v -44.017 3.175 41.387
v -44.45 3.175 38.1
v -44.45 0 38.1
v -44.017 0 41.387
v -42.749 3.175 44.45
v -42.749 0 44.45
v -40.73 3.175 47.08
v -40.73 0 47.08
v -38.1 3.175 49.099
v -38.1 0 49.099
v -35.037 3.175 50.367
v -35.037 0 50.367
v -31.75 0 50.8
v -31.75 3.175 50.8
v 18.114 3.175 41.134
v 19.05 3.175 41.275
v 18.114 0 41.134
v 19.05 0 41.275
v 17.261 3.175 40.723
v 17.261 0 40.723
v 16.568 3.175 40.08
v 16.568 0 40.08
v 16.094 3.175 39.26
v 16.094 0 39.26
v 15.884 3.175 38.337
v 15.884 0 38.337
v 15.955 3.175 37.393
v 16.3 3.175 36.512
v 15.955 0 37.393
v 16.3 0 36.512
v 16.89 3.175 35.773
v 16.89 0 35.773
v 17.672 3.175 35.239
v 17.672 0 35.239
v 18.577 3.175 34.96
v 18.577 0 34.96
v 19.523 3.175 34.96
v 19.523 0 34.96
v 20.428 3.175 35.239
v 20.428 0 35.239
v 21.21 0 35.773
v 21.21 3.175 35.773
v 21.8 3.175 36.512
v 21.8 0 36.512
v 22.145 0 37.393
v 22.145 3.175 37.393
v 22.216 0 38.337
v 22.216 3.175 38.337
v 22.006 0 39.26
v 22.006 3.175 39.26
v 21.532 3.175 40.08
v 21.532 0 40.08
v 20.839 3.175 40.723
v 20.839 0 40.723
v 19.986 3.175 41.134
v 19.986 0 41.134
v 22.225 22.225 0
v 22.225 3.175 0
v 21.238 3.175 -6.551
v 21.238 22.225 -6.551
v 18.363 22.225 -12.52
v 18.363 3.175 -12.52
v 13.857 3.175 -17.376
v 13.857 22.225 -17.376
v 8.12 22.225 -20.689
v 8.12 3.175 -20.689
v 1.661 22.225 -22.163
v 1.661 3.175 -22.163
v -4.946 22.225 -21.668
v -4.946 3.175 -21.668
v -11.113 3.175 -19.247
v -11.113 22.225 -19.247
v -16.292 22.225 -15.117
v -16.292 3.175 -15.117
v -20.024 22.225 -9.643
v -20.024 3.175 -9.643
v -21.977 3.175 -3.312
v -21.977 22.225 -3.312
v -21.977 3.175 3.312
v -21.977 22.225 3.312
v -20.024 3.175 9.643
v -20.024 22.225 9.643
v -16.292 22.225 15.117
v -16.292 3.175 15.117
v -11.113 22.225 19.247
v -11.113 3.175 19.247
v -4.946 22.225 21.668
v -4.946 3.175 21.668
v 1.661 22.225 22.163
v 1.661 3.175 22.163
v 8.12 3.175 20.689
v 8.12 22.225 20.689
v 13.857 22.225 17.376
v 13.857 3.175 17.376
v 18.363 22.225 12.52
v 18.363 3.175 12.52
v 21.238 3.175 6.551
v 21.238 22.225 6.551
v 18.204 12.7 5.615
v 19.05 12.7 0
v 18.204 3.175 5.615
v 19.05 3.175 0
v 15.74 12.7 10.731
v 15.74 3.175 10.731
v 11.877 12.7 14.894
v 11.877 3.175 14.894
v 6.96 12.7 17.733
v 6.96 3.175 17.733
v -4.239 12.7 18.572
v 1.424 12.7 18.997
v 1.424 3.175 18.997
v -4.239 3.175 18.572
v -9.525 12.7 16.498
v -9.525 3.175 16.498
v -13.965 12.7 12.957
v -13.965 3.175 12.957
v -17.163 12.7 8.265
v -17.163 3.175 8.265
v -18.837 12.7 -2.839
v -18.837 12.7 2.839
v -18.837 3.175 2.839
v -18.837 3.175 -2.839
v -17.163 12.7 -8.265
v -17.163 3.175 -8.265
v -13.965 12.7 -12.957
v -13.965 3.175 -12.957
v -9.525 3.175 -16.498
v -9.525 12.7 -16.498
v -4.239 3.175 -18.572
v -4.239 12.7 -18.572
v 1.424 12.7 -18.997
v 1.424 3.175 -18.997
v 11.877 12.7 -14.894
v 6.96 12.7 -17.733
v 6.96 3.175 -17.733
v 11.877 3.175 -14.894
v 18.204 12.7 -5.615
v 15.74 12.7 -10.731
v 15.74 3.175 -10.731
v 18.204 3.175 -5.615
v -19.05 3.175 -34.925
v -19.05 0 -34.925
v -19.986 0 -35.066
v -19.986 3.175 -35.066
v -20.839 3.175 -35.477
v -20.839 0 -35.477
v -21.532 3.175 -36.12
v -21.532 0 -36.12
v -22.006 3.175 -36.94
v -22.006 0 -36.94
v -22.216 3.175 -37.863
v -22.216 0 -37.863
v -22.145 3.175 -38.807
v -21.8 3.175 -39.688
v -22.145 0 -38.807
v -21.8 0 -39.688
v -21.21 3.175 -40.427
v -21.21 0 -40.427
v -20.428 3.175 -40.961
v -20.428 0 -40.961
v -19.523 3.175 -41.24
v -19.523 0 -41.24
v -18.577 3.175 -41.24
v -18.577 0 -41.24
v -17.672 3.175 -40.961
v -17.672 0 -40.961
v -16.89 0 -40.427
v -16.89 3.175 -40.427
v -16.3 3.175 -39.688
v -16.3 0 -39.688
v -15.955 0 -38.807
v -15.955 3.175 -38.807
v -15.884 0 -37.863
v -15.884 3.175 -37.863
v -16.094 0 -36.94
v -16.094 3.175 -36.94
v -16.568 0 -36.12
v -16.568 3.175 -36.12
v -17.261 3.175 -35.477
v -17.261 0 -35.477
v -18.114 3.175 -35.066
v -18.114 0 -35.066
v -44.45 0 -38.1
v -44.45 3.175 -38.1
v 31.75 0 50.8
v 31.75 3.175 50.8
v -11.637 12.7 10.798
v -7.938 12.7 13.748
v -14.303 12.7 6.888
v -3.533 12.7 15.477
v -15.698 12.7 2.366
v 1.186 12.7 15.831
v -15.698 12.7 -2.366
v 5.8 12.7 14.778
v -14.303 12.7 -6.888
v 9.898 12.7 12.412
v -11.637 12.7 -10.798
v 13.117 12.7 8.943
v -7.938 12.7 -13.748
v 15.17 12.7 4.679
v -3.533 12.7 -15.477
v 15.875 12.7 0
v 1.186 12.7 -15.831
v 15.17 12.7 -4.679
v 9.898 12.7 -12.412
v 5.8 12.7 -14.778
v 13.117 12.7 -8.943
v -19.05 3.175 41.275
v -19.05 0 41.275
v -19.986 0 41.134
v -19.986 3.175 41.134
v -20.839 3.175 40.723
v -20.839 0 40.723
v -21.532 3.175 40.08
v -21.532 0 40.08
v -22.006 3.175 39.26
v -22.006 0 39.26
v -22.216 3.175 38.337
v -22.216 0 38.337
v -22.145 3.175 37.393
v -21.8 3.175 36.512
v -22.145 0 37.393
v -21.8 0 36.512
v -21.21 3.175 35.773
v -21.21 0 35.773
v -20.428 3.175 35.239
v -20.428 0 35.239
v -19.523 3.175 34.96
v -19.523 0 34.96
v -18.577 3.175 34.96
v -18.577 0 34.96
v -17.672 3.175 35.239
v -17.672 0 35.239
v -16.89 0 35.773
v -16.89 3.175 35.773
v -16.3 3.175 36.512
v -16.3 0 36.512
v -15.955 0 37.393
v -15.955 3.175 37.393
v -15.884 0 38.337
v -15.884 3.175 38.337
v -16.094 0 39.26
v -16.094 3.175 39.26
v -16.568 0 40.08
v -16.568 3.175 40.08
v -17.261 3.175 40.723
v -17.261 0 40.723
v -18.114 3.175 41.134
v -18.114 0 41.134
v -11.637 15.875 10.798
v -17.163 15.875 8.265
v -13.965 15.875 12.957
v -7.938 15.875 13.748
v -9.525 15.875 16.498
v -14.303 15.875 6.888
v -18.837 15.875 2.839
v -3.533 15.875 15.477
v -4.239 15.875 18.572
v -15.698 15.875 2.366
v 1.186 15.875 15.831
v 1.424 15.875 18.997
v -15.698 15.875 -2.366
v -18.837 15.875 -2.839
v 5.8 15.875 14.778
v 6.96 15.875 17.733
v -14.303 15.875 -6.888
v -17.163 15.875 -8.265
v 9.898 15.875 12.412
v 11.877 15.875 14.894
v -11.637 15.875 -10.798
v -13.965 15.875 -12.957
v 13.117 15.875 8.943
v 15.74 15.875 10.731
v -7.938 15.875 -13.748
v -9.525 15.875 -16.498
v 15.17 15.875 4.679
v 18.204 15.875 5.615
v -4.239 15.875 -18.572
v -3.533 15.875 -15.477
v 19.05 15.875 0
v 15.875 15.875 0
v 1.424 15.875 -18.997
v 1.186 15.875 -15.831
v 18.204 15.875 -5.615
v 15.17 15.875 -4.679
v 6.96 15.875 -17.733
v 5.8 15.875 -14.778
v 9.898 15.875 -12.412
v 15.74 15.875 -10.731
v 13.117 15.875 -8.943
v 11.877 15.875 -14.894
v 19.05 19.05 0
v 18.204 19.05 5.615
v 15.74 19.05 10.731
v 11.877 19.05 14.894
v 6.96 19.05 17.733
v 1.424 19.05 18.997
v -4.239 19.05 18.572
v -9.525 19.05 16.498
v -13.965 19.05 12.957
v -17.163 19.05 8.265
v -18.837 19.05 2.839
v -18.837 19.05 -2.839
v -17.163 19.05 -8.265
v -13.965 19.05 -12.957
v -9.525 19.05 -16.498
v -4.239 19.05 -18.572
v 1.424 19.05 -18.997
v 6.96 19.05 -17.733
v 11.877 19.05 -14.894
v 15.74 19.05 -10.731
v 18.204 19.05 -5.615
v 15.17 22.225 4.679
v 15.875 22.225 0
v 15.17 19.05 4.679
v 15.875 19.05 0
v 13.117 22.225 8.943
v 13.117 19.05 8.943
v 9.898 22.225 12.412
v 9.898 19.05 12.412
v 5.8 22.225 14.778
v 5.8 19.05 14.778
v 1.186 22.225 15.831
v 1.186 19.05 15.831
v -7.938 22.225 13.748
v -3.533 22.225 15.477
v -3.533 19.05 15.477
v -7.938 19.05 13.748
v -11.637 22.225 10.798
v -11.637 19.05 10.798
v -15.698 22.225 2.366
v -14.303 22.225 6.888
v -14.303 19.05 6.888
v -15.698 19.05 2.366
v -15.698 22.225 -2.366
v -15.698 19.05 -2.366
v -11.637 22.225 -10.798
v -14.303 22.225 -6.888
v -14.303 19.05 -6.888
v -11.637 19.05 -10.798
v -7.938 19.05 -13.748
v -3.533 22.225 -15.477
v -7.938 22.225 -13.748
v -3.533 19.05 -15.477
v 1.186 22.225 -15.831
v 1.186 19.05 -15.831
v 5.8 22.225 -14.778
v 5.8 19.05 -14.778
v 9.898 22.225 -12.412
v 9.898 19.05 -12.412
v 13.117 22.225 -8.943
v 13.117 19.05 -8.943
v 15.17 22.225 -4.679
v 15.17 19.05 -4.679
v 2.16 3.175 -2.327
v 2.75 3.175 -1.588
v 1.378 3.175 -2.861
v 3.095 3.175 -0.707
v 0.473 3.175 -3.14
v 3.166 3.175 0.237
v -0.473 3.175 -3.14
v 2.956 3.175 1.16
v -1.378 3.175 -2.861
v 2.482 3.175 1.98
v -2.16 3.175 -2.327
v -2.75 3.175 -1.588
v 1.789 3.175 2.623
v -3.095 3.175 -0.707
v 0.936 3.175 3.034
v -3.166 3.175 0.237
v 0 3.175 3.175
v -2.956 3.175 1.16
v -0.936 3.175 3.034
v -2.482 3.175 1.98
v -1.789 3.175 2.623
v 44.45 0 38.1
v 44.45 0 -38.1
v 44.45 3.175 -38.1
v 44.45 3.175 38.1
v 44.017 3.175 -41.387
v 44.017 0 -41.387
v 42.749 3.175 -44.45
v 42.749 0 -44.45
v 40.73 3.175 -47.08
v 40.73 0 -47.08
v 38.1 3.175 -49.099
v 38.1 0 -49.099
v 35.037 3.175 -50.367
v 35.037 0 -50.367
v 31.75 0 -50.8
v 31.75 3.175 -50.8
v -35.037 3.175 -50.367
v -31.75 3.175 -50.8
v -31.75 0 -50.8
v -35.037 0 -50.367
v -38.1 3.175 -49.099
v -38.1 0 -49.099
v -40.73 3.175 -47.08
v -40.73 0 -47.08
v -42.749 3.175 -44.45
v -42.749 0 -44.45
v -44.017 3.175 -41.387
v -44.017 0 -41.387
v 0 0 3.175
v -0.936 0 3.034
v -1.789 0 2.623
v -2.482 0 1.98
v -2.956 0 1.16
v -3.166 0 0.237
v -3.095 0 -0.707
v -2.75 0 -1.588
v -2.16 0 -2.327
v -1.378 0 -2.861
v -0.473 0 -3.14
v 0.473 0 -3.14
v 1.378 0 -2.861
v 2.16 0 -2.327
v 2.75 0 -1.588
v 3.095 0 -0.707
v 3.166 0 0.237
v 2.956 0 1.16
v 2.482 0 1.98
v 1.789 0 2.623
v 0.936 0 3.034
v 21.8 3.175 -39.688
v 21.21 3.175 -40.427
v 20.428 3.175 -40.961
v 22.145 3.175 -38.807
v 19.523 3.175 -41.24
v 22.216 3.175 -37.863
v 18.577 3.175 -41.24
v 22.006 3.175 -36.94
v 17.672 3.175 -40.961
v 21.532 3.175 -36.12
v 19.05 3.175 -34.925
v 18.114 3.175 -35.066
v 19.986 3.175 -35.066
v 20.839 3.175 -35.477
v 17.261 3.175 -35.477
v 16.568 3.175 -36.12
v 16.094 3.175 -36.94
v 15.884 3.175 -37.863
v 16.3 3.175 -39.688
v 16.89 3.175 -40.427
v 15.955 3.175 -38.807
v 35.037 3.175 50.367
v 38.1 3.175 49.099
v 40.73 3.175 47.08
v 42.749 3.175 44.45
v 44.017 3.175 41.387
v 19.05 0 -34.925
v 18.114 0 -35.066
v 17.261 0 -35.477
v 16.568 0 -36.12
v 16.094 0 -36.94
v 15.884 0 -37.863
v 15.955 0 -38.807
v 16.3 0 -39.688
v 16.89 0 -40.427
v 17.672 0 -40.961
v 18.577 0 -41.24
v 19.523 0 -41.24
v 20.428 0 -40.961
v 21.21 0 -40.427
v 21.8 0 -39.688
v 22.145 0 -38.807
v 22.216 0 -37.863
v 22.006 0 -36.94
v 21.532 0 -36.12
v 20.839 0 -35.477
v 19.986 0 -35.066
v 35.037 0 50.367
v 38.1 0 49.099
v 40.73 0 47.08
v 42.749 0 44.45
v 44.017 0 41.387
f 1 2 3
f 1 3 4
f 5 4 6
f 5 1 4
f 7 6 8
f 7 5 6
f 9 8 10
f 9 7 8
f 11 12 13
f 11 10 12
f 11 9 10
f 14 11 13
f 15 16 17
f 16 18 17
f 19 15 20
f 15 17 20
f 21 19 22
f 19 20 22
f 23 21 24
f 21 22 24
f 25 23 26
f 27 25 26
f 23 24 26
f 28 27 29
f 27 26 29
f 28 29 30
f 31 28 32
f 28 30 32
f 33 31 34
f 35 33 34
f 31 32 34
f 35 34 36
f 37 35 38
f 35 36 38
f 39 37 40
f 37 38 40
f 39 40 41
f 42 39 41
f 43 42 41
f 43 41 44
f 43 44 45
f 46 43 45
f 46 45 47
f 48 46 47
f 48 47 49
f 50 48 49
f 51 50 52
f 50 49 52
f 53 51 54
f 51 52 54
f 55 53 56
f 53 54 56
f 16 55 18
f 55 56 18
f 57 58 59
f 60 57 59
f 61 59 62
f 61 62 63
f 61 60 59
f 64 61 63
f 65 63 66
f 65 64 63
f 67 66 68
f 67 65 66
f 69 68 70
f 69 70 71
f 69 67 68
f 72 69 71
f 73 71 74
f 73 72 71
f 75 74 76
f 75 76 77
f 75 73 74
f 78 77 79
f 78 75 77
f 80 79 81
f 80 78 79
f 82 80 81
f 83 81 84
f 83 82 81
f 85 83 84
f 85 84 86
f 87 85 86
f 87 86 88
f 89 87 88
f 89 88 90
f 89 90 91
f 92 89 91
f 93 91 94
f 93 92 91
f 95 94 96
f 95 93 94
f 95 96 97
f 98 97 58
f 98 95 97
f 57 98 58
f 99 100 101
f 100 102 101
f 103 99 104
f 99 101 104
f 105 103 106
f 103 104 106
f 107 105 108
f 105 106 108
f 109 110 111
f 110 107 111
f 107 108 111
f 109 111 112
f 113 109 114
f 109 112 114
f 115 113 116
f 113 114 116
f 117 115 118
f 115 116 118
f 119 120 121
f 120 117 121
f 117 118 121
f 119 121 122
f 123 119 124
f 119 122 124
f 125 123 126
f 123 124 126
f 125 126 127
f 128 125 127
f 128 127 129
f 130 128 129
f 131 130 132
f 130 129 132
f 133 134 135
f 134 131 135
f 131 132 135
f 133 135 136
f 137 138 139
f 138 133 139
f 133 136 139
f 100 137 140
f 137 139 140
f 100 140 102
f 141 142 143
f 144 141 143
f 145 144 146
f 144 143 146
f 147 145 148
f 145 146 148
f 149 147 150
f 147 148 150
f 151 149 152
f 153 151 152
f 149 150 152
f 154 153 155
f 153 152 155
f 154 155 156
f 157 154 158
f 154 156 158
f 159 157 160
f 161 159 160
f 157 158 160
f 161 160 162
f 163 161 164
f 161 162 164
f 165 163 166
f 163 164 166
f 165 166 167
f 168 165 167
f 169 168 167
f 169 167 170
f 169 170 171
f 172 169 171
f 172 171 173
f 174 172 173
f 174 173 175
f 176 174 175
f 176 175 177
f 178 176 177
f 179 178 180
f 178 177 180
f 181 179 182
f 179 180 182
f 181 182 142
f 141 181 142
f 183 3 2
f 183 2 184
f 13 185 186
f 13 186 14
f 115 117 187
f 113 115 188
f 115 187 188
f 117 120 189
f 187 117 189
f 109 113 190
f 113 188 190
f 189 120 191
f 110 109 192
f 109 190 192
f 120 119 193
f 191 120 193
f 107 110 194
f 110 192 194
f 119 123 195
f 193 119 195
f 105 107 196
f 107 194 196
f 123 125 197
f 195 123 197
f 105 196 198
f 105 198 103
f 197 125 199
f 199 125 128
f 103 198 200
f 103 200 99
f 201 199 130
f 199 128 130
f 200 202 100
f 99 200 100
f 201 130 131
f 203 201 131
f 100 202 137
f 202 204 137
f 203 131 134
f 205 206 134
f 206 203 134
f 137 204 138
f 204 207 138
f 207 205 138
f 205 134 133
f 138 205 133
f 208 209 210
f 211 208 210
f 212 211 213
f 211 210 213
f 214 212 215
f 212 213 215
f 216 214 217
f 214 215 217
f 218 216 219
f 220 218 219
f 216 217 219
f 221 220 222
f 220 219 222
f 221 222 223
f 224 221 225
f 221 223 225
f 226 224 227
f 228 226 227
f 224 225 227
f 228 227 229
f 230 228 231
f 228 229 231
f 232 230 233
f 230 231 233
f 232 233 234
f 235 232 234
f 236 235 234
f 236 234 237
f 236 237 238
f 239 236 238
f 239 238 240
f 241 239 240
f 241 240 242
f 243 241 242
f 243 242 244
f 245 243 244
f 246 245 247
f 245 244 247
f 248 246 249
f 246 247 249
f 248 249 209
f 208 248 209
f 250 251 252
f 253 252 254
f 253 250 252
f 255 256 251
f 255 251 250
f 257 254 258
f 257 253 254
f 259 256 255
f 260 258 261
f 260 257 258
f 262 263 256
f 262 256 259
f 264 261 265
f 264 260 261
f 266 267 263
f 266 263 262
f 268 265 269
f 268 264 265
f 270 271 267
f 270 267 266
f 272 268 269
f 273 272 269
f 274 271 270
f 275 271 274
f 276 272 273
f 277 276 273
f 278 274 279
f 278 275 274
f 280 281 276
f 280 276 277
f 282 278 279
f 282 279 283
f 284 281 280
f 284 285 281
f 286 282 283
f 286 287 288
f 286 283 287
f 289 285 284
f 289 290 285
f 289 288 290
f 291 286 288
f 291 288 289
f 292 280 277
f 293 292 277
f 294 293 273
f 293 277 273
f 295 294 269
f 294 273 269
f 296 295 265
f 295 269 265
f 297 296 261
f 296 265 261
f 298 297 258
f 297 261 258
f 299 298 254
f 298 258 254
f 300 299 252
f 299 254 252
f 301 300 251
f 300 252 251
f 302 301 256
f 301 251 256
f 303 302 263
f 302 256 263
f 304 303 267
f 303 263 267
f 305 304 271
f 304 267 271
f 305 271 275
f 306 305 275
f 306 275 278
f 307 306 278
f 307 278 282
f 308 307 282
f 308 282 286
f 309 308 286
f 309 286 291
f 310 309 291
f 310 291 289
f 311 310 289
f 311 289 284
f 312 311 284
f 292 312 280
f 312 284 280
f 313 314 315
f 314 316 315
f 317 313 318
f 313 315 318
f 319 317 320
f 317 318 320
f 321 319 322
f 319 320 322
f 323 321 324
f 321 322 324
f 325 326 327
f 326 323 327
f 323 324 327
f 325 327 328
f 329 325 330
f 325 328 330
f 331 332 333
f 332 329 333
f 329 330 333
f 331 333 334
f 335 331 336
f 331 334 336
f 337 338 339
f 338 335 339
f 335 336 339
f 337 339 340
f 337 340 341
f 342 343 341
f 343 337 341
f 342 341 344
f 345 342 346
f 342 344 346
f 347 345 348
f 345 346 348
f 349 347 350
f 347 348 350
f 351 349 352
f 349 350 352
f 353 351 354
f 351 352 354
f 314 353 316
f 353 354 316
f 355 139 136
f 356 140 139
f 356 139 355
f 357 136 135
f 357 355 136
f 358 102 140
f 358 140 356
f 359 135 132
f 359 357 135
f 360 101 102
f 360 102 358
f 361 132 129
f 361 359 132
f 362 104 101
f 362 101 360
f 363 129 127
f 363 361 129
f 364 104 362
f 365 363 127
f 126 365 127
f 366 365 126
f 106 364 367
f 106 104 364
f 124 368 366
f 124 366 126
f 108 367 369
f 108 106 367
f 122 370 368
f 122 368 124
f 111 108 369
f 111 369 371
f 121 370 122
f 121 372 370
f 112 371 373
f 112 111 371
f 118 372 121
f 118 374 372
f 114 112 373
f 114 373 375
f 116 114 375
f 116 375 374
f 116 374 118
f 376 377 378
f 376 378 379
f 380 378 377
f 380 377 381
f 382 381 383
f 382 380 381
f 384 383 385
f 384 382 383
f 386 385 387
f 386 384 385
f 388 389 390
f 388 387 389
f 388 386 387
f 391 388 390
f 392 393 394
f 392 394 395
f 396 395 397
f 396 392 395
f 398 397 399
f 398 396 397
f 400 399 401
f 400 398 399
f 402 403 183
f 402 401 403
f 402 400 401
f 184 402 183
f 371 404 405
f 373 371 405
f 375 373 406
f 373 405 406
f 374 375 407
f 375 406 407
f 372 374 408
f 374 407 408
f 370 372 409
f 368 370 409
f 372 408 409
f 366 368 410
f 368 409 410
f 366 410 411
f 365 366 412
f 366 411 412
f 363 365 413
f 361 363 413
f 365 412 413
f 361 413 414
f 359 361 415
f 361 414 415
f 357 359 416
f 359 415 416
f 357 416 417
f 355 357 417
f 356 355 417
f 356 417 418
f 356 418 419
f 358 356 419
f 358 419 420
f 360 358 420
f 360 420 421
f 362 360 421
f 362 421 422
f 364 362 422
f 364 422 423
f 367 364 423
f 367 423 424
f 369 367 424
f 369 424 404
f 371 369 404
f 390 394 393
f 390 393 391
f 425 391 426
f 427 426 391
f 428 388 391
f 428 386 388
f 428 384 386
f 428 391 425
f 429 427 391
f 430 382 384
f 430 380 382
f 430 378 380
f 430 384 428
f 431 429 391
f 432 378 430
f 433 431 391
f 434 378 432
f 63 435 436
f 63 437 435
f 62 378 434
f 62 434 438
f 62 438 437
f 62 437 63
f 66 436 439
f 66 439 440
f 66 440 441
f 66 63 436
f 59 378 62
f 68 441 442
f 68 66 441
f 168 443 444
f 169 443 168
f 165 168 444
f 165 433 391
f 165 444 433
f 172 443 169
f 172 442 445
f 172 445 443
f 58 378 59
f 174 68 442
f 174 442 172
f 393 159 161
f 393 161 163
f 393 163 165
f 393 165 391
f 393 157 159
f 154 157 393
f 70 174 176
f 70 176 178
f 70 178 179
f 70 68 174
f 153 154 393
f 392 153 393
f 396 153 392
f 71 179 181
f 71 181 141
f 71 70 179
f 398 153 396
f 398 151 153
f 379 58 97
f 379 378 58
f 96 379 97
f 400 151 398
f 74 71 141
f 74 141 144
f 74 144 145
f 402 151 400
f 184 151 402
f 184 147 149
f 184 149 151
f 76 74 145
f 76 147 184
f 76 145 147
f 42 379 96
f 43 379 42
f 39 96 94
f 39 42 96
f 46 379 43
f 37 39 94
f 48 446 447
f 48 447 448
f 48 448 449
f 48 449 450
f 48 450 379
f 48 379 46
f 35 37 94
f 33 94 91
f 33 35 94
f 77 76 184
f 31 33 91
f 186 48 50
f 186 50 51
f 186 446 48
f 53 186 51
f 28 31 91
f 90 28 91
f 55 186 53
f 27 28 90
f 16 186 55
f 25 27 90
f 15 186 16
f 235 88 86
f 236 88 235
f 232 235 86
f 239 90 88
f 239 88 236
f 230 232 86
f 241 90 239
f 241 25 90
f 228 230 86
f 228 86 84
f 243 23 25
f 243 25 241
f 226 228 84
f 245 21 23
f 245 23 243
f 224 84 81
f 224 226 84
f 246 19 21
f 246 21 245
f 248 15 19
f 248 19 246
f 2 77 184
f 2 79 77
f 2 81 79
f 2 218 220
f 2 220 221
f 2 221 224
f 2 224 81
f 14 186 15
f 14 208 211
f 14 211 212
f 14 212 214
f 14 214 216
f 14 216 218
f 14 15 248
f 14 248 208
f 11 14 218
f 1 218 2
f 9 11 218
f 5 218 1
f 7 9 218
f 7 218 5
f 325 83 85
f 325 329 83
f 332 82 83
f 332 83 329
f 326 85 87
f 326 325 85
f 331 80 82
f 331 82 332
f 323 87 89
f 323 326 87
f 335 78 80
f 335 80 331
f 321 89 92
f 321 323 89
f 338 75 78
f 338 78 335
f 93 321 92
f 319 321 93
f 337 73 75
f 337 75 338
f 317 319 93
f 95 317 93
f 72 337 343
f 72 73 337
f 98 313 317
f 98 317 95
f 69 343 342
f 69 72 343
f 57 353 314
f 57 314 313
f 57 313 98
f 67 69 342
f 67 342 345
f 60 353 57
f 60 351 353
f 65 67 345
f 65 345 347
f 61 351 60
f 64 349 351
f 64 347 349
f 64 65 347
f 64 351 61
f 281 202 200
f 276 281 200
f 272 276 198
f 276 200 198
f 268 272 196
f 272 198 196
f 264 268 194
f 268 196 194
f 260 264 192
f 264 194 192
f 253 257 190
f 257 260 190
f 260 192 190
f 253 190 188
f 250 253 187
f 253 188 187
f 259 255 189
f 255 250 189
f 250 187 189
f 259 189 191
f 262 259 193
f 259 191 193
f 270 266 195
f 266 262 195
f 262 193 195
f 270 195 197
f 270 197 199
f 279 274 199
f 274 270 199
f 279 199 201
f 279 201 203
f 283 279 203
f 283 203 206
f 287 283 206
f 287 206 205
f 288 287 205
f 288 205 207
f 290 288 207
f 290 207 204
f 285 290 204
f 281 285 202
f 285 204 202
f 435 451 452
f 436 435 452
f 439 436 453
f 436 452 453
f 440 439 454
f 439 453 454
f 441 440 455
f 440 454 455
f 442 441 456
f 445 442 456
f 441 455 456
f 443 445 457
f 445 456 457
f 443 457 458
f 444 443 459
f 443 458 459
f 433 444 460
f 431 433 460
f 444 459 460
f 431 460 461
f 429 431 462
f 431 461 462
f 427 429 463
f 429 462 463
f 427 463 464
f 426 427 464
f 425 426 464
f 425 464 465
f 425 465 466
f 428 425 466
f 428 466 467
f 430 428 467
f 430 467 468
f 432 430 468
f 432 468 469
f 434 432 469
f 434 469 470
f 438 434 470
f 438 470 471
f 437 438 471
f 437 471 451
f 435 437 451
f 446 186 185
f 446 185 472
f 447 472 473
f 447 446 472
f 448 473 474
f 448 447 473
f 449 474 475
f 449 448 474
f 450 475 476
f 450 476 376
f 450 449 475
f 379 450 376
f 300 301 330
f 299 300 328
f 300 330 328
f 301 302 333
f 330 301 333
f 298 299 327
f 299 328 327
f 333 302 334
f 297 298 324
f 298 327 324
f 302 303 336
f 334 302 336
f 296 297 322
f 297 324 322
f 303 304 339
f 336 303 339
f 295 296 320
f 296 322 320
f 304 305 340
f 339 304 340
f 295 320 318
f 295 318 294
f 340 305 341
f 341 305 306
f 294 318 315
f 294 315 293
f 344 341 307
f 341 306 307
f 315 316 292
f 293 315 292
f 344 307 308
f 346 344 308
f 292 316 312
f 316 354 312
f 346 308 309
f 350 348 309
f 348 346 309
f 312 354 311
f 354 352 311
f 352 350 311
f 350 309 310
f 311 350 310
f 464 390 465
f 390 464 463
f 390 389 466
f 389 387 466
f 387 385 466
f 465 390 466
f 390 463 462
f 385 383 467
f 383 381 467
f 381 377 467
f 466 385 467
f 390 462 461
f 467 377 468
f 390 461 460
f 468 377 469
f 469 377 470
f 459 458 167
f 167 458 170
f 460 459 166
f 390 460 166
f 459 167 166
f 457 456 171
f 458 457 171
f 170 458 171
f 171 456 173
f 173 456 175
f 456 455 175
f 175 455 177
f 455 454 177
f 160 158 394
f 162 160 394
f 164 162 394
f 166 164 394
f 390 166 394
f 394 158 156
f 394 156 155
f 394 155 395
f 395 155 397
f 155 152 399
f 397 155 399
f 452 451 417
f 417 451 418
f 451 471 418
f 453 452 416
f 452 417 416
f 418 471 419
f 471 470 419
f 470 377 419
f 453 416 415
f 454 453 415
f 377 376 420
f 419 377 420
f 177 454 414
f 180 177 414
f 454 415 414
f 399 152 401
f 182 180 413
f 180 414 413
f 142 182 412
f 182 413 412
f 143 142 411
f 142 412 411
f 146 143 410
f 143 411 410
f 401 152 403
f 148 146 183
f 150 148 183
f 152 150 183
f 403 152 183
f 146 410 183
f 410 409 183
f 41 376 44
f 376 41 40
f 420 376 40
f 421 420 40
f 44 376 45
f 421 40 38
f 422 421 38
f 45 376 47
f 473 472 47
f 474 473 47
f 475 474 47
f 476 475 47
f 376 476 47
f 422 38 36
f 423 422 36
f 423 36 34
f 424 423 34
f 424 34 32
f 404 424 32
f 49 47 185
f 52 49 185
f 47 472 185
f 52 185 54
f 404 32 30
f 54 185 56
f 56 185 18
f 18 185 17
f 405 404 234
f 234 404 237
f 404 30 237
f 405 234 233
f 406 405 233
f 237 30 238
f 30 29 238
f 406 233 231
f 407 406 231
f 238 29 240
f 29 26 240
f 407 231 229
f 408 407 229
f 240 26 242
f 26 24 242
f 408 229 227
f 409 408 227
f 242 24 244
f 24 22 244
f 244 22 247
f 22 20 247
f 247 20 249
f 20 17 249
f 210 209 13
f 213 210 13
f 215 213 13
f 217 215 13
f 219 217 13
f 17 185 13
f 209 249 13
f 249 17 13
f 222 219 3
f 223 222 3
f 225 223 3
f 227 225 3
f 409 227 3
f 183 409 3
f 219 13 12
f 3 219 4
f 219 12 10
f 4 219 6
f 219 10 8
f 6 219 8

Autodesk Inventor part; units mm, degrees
ref_plane "YZ Plane" through (0, 0, 0) normal (1, 0, 0) x (0, 1, 0)
ref_plane "XZ Plane" through (0, 0, 0) normal (0, 1, 0) x (-1, 0, 0)
ref_plane "XY Plane" through (0, 0, 0) normal (0, 0, 1) x (1, 0, 0)
sketch "Sketch2" plane through (0, 0, 0) normal (0, 1, 0) x (-1, 0, 0)
  line L0 (-44.45, 50.8) -> (44.45, 50.8)
  line L1 (44.45, 50.8) -> (44.45, -50.8)
  line L2 (44.45, -50.8) -> (-44.45, -50.8)
  line L3 (-44.45, -50.8) -> (-44.45, 50.8)
  point P0 (0, 0)
  dimension "d0" = 44.45
  dimension "d1" = 44.45
  dimension "d2" = 50.8
  dimension "d3" = 50.8
extrude "Extrusion1" add sketch "Sketch2" along normal blind 3.175
fillet "Fillet1" radius 12.7 4 edges at (44.45, 1.5875, 50.8) (-44.45, 1.5875, 50.8) (44.45, 1.5875, -50.8) (-44.45, 1.5875, -50.8)
sketch "Sketch3" plane through (0, 3.175, 0) normal (0, 1, 0) x (1, 0, 0)
  line L0 (-44.45, -38.1) -> (-44.45, 38.1) projected
  line L1 (31.75, -50.8) -> (-31.75, -50.8) projected
  line L2 (44.45, 38.1) -> (44.45, -38.1) projected
  line L3 (-31.75, 50.8) -> (31.75, 50.8) projected
  point P0 (0, 0)
  point P1 (0, 0)
  point P2 (-19.05, 38.1)
  point P3 (19.05, 38.1)
  point P4 (19.05, -38.1)
  point P5 (-19.05, -38.1)
  dimension "d7" = 12.7
  dimension "d8" = 25.4
  dimension "d9" = 25.4
  dimension "d10" = 12.7
hole "Hole1" at (0, 3.175, 0) at (-19.05, 3.175, -38.1) at (19.05, 3.175, -38.1) at (19.05, 3.175, 38.1) at (-19.05, 3.175, 38.1) direction (0, -1, 0) diameter 6.35 end through all
sketch "Sketch4" plane through (0, 0, 0) normal (0, 0, 1) x (1, 0, 0)
  line L0 (22.225, 3.175) -> (22.225, 22.225)
  line L1 (22.225, 22.225) -> (15.875, 22.225)
  line L2 (15.875, 22.225) -> (15.875, 19.05)
  line L3 (15.875, 19.05) -> (19.05, 19.05)
  line L4 (19.05, 19.05) -> (19.05, 15.875)
  line L5 (19.05, 15.875) -> (15.875, 15.875)
  line L6 (15.875, 15.875) -> (15.875, 12.7)
  line L7 (15.875, 12.7) -> (19.05, 12.7)
  line L8 (19.05, 12.7) -> (19.05, 3.175)
  line L9 (19.05, 3.175) -> (22.225, 3.175)
  line L10 (0, -4.445) -> (0, 26.67) projected
  point P0 (0, 0)
  dimension "d18" = 19.05
  dimension "d19" = 22.225
  dimension "d20" = 3.175
  dimension "d21" = 6.35
  dimension "d22" = 3.175
  dimension "d23" = 3.175
  dimension "d24" = 3.175
  dimension "d25" = 3.175
  dimension "d26" = 3.175
  dimension "d27" = 3.175
  dimension "d28" = 9.525
revolve "Revolution1" add sketch "Sketch4" angle 360 about axis through (0, -10, 0) along (0, 1, 0)
equation "\"d1\" = d0"
equation "\"d3\" = d2"
equation "\"d4\" = metalThickness"
equation "\"d9\" = d8"
equation "\"d10\" = d7"
equation "\"metalThickness\" = 3.175"
properties part number "Rotation Top"
